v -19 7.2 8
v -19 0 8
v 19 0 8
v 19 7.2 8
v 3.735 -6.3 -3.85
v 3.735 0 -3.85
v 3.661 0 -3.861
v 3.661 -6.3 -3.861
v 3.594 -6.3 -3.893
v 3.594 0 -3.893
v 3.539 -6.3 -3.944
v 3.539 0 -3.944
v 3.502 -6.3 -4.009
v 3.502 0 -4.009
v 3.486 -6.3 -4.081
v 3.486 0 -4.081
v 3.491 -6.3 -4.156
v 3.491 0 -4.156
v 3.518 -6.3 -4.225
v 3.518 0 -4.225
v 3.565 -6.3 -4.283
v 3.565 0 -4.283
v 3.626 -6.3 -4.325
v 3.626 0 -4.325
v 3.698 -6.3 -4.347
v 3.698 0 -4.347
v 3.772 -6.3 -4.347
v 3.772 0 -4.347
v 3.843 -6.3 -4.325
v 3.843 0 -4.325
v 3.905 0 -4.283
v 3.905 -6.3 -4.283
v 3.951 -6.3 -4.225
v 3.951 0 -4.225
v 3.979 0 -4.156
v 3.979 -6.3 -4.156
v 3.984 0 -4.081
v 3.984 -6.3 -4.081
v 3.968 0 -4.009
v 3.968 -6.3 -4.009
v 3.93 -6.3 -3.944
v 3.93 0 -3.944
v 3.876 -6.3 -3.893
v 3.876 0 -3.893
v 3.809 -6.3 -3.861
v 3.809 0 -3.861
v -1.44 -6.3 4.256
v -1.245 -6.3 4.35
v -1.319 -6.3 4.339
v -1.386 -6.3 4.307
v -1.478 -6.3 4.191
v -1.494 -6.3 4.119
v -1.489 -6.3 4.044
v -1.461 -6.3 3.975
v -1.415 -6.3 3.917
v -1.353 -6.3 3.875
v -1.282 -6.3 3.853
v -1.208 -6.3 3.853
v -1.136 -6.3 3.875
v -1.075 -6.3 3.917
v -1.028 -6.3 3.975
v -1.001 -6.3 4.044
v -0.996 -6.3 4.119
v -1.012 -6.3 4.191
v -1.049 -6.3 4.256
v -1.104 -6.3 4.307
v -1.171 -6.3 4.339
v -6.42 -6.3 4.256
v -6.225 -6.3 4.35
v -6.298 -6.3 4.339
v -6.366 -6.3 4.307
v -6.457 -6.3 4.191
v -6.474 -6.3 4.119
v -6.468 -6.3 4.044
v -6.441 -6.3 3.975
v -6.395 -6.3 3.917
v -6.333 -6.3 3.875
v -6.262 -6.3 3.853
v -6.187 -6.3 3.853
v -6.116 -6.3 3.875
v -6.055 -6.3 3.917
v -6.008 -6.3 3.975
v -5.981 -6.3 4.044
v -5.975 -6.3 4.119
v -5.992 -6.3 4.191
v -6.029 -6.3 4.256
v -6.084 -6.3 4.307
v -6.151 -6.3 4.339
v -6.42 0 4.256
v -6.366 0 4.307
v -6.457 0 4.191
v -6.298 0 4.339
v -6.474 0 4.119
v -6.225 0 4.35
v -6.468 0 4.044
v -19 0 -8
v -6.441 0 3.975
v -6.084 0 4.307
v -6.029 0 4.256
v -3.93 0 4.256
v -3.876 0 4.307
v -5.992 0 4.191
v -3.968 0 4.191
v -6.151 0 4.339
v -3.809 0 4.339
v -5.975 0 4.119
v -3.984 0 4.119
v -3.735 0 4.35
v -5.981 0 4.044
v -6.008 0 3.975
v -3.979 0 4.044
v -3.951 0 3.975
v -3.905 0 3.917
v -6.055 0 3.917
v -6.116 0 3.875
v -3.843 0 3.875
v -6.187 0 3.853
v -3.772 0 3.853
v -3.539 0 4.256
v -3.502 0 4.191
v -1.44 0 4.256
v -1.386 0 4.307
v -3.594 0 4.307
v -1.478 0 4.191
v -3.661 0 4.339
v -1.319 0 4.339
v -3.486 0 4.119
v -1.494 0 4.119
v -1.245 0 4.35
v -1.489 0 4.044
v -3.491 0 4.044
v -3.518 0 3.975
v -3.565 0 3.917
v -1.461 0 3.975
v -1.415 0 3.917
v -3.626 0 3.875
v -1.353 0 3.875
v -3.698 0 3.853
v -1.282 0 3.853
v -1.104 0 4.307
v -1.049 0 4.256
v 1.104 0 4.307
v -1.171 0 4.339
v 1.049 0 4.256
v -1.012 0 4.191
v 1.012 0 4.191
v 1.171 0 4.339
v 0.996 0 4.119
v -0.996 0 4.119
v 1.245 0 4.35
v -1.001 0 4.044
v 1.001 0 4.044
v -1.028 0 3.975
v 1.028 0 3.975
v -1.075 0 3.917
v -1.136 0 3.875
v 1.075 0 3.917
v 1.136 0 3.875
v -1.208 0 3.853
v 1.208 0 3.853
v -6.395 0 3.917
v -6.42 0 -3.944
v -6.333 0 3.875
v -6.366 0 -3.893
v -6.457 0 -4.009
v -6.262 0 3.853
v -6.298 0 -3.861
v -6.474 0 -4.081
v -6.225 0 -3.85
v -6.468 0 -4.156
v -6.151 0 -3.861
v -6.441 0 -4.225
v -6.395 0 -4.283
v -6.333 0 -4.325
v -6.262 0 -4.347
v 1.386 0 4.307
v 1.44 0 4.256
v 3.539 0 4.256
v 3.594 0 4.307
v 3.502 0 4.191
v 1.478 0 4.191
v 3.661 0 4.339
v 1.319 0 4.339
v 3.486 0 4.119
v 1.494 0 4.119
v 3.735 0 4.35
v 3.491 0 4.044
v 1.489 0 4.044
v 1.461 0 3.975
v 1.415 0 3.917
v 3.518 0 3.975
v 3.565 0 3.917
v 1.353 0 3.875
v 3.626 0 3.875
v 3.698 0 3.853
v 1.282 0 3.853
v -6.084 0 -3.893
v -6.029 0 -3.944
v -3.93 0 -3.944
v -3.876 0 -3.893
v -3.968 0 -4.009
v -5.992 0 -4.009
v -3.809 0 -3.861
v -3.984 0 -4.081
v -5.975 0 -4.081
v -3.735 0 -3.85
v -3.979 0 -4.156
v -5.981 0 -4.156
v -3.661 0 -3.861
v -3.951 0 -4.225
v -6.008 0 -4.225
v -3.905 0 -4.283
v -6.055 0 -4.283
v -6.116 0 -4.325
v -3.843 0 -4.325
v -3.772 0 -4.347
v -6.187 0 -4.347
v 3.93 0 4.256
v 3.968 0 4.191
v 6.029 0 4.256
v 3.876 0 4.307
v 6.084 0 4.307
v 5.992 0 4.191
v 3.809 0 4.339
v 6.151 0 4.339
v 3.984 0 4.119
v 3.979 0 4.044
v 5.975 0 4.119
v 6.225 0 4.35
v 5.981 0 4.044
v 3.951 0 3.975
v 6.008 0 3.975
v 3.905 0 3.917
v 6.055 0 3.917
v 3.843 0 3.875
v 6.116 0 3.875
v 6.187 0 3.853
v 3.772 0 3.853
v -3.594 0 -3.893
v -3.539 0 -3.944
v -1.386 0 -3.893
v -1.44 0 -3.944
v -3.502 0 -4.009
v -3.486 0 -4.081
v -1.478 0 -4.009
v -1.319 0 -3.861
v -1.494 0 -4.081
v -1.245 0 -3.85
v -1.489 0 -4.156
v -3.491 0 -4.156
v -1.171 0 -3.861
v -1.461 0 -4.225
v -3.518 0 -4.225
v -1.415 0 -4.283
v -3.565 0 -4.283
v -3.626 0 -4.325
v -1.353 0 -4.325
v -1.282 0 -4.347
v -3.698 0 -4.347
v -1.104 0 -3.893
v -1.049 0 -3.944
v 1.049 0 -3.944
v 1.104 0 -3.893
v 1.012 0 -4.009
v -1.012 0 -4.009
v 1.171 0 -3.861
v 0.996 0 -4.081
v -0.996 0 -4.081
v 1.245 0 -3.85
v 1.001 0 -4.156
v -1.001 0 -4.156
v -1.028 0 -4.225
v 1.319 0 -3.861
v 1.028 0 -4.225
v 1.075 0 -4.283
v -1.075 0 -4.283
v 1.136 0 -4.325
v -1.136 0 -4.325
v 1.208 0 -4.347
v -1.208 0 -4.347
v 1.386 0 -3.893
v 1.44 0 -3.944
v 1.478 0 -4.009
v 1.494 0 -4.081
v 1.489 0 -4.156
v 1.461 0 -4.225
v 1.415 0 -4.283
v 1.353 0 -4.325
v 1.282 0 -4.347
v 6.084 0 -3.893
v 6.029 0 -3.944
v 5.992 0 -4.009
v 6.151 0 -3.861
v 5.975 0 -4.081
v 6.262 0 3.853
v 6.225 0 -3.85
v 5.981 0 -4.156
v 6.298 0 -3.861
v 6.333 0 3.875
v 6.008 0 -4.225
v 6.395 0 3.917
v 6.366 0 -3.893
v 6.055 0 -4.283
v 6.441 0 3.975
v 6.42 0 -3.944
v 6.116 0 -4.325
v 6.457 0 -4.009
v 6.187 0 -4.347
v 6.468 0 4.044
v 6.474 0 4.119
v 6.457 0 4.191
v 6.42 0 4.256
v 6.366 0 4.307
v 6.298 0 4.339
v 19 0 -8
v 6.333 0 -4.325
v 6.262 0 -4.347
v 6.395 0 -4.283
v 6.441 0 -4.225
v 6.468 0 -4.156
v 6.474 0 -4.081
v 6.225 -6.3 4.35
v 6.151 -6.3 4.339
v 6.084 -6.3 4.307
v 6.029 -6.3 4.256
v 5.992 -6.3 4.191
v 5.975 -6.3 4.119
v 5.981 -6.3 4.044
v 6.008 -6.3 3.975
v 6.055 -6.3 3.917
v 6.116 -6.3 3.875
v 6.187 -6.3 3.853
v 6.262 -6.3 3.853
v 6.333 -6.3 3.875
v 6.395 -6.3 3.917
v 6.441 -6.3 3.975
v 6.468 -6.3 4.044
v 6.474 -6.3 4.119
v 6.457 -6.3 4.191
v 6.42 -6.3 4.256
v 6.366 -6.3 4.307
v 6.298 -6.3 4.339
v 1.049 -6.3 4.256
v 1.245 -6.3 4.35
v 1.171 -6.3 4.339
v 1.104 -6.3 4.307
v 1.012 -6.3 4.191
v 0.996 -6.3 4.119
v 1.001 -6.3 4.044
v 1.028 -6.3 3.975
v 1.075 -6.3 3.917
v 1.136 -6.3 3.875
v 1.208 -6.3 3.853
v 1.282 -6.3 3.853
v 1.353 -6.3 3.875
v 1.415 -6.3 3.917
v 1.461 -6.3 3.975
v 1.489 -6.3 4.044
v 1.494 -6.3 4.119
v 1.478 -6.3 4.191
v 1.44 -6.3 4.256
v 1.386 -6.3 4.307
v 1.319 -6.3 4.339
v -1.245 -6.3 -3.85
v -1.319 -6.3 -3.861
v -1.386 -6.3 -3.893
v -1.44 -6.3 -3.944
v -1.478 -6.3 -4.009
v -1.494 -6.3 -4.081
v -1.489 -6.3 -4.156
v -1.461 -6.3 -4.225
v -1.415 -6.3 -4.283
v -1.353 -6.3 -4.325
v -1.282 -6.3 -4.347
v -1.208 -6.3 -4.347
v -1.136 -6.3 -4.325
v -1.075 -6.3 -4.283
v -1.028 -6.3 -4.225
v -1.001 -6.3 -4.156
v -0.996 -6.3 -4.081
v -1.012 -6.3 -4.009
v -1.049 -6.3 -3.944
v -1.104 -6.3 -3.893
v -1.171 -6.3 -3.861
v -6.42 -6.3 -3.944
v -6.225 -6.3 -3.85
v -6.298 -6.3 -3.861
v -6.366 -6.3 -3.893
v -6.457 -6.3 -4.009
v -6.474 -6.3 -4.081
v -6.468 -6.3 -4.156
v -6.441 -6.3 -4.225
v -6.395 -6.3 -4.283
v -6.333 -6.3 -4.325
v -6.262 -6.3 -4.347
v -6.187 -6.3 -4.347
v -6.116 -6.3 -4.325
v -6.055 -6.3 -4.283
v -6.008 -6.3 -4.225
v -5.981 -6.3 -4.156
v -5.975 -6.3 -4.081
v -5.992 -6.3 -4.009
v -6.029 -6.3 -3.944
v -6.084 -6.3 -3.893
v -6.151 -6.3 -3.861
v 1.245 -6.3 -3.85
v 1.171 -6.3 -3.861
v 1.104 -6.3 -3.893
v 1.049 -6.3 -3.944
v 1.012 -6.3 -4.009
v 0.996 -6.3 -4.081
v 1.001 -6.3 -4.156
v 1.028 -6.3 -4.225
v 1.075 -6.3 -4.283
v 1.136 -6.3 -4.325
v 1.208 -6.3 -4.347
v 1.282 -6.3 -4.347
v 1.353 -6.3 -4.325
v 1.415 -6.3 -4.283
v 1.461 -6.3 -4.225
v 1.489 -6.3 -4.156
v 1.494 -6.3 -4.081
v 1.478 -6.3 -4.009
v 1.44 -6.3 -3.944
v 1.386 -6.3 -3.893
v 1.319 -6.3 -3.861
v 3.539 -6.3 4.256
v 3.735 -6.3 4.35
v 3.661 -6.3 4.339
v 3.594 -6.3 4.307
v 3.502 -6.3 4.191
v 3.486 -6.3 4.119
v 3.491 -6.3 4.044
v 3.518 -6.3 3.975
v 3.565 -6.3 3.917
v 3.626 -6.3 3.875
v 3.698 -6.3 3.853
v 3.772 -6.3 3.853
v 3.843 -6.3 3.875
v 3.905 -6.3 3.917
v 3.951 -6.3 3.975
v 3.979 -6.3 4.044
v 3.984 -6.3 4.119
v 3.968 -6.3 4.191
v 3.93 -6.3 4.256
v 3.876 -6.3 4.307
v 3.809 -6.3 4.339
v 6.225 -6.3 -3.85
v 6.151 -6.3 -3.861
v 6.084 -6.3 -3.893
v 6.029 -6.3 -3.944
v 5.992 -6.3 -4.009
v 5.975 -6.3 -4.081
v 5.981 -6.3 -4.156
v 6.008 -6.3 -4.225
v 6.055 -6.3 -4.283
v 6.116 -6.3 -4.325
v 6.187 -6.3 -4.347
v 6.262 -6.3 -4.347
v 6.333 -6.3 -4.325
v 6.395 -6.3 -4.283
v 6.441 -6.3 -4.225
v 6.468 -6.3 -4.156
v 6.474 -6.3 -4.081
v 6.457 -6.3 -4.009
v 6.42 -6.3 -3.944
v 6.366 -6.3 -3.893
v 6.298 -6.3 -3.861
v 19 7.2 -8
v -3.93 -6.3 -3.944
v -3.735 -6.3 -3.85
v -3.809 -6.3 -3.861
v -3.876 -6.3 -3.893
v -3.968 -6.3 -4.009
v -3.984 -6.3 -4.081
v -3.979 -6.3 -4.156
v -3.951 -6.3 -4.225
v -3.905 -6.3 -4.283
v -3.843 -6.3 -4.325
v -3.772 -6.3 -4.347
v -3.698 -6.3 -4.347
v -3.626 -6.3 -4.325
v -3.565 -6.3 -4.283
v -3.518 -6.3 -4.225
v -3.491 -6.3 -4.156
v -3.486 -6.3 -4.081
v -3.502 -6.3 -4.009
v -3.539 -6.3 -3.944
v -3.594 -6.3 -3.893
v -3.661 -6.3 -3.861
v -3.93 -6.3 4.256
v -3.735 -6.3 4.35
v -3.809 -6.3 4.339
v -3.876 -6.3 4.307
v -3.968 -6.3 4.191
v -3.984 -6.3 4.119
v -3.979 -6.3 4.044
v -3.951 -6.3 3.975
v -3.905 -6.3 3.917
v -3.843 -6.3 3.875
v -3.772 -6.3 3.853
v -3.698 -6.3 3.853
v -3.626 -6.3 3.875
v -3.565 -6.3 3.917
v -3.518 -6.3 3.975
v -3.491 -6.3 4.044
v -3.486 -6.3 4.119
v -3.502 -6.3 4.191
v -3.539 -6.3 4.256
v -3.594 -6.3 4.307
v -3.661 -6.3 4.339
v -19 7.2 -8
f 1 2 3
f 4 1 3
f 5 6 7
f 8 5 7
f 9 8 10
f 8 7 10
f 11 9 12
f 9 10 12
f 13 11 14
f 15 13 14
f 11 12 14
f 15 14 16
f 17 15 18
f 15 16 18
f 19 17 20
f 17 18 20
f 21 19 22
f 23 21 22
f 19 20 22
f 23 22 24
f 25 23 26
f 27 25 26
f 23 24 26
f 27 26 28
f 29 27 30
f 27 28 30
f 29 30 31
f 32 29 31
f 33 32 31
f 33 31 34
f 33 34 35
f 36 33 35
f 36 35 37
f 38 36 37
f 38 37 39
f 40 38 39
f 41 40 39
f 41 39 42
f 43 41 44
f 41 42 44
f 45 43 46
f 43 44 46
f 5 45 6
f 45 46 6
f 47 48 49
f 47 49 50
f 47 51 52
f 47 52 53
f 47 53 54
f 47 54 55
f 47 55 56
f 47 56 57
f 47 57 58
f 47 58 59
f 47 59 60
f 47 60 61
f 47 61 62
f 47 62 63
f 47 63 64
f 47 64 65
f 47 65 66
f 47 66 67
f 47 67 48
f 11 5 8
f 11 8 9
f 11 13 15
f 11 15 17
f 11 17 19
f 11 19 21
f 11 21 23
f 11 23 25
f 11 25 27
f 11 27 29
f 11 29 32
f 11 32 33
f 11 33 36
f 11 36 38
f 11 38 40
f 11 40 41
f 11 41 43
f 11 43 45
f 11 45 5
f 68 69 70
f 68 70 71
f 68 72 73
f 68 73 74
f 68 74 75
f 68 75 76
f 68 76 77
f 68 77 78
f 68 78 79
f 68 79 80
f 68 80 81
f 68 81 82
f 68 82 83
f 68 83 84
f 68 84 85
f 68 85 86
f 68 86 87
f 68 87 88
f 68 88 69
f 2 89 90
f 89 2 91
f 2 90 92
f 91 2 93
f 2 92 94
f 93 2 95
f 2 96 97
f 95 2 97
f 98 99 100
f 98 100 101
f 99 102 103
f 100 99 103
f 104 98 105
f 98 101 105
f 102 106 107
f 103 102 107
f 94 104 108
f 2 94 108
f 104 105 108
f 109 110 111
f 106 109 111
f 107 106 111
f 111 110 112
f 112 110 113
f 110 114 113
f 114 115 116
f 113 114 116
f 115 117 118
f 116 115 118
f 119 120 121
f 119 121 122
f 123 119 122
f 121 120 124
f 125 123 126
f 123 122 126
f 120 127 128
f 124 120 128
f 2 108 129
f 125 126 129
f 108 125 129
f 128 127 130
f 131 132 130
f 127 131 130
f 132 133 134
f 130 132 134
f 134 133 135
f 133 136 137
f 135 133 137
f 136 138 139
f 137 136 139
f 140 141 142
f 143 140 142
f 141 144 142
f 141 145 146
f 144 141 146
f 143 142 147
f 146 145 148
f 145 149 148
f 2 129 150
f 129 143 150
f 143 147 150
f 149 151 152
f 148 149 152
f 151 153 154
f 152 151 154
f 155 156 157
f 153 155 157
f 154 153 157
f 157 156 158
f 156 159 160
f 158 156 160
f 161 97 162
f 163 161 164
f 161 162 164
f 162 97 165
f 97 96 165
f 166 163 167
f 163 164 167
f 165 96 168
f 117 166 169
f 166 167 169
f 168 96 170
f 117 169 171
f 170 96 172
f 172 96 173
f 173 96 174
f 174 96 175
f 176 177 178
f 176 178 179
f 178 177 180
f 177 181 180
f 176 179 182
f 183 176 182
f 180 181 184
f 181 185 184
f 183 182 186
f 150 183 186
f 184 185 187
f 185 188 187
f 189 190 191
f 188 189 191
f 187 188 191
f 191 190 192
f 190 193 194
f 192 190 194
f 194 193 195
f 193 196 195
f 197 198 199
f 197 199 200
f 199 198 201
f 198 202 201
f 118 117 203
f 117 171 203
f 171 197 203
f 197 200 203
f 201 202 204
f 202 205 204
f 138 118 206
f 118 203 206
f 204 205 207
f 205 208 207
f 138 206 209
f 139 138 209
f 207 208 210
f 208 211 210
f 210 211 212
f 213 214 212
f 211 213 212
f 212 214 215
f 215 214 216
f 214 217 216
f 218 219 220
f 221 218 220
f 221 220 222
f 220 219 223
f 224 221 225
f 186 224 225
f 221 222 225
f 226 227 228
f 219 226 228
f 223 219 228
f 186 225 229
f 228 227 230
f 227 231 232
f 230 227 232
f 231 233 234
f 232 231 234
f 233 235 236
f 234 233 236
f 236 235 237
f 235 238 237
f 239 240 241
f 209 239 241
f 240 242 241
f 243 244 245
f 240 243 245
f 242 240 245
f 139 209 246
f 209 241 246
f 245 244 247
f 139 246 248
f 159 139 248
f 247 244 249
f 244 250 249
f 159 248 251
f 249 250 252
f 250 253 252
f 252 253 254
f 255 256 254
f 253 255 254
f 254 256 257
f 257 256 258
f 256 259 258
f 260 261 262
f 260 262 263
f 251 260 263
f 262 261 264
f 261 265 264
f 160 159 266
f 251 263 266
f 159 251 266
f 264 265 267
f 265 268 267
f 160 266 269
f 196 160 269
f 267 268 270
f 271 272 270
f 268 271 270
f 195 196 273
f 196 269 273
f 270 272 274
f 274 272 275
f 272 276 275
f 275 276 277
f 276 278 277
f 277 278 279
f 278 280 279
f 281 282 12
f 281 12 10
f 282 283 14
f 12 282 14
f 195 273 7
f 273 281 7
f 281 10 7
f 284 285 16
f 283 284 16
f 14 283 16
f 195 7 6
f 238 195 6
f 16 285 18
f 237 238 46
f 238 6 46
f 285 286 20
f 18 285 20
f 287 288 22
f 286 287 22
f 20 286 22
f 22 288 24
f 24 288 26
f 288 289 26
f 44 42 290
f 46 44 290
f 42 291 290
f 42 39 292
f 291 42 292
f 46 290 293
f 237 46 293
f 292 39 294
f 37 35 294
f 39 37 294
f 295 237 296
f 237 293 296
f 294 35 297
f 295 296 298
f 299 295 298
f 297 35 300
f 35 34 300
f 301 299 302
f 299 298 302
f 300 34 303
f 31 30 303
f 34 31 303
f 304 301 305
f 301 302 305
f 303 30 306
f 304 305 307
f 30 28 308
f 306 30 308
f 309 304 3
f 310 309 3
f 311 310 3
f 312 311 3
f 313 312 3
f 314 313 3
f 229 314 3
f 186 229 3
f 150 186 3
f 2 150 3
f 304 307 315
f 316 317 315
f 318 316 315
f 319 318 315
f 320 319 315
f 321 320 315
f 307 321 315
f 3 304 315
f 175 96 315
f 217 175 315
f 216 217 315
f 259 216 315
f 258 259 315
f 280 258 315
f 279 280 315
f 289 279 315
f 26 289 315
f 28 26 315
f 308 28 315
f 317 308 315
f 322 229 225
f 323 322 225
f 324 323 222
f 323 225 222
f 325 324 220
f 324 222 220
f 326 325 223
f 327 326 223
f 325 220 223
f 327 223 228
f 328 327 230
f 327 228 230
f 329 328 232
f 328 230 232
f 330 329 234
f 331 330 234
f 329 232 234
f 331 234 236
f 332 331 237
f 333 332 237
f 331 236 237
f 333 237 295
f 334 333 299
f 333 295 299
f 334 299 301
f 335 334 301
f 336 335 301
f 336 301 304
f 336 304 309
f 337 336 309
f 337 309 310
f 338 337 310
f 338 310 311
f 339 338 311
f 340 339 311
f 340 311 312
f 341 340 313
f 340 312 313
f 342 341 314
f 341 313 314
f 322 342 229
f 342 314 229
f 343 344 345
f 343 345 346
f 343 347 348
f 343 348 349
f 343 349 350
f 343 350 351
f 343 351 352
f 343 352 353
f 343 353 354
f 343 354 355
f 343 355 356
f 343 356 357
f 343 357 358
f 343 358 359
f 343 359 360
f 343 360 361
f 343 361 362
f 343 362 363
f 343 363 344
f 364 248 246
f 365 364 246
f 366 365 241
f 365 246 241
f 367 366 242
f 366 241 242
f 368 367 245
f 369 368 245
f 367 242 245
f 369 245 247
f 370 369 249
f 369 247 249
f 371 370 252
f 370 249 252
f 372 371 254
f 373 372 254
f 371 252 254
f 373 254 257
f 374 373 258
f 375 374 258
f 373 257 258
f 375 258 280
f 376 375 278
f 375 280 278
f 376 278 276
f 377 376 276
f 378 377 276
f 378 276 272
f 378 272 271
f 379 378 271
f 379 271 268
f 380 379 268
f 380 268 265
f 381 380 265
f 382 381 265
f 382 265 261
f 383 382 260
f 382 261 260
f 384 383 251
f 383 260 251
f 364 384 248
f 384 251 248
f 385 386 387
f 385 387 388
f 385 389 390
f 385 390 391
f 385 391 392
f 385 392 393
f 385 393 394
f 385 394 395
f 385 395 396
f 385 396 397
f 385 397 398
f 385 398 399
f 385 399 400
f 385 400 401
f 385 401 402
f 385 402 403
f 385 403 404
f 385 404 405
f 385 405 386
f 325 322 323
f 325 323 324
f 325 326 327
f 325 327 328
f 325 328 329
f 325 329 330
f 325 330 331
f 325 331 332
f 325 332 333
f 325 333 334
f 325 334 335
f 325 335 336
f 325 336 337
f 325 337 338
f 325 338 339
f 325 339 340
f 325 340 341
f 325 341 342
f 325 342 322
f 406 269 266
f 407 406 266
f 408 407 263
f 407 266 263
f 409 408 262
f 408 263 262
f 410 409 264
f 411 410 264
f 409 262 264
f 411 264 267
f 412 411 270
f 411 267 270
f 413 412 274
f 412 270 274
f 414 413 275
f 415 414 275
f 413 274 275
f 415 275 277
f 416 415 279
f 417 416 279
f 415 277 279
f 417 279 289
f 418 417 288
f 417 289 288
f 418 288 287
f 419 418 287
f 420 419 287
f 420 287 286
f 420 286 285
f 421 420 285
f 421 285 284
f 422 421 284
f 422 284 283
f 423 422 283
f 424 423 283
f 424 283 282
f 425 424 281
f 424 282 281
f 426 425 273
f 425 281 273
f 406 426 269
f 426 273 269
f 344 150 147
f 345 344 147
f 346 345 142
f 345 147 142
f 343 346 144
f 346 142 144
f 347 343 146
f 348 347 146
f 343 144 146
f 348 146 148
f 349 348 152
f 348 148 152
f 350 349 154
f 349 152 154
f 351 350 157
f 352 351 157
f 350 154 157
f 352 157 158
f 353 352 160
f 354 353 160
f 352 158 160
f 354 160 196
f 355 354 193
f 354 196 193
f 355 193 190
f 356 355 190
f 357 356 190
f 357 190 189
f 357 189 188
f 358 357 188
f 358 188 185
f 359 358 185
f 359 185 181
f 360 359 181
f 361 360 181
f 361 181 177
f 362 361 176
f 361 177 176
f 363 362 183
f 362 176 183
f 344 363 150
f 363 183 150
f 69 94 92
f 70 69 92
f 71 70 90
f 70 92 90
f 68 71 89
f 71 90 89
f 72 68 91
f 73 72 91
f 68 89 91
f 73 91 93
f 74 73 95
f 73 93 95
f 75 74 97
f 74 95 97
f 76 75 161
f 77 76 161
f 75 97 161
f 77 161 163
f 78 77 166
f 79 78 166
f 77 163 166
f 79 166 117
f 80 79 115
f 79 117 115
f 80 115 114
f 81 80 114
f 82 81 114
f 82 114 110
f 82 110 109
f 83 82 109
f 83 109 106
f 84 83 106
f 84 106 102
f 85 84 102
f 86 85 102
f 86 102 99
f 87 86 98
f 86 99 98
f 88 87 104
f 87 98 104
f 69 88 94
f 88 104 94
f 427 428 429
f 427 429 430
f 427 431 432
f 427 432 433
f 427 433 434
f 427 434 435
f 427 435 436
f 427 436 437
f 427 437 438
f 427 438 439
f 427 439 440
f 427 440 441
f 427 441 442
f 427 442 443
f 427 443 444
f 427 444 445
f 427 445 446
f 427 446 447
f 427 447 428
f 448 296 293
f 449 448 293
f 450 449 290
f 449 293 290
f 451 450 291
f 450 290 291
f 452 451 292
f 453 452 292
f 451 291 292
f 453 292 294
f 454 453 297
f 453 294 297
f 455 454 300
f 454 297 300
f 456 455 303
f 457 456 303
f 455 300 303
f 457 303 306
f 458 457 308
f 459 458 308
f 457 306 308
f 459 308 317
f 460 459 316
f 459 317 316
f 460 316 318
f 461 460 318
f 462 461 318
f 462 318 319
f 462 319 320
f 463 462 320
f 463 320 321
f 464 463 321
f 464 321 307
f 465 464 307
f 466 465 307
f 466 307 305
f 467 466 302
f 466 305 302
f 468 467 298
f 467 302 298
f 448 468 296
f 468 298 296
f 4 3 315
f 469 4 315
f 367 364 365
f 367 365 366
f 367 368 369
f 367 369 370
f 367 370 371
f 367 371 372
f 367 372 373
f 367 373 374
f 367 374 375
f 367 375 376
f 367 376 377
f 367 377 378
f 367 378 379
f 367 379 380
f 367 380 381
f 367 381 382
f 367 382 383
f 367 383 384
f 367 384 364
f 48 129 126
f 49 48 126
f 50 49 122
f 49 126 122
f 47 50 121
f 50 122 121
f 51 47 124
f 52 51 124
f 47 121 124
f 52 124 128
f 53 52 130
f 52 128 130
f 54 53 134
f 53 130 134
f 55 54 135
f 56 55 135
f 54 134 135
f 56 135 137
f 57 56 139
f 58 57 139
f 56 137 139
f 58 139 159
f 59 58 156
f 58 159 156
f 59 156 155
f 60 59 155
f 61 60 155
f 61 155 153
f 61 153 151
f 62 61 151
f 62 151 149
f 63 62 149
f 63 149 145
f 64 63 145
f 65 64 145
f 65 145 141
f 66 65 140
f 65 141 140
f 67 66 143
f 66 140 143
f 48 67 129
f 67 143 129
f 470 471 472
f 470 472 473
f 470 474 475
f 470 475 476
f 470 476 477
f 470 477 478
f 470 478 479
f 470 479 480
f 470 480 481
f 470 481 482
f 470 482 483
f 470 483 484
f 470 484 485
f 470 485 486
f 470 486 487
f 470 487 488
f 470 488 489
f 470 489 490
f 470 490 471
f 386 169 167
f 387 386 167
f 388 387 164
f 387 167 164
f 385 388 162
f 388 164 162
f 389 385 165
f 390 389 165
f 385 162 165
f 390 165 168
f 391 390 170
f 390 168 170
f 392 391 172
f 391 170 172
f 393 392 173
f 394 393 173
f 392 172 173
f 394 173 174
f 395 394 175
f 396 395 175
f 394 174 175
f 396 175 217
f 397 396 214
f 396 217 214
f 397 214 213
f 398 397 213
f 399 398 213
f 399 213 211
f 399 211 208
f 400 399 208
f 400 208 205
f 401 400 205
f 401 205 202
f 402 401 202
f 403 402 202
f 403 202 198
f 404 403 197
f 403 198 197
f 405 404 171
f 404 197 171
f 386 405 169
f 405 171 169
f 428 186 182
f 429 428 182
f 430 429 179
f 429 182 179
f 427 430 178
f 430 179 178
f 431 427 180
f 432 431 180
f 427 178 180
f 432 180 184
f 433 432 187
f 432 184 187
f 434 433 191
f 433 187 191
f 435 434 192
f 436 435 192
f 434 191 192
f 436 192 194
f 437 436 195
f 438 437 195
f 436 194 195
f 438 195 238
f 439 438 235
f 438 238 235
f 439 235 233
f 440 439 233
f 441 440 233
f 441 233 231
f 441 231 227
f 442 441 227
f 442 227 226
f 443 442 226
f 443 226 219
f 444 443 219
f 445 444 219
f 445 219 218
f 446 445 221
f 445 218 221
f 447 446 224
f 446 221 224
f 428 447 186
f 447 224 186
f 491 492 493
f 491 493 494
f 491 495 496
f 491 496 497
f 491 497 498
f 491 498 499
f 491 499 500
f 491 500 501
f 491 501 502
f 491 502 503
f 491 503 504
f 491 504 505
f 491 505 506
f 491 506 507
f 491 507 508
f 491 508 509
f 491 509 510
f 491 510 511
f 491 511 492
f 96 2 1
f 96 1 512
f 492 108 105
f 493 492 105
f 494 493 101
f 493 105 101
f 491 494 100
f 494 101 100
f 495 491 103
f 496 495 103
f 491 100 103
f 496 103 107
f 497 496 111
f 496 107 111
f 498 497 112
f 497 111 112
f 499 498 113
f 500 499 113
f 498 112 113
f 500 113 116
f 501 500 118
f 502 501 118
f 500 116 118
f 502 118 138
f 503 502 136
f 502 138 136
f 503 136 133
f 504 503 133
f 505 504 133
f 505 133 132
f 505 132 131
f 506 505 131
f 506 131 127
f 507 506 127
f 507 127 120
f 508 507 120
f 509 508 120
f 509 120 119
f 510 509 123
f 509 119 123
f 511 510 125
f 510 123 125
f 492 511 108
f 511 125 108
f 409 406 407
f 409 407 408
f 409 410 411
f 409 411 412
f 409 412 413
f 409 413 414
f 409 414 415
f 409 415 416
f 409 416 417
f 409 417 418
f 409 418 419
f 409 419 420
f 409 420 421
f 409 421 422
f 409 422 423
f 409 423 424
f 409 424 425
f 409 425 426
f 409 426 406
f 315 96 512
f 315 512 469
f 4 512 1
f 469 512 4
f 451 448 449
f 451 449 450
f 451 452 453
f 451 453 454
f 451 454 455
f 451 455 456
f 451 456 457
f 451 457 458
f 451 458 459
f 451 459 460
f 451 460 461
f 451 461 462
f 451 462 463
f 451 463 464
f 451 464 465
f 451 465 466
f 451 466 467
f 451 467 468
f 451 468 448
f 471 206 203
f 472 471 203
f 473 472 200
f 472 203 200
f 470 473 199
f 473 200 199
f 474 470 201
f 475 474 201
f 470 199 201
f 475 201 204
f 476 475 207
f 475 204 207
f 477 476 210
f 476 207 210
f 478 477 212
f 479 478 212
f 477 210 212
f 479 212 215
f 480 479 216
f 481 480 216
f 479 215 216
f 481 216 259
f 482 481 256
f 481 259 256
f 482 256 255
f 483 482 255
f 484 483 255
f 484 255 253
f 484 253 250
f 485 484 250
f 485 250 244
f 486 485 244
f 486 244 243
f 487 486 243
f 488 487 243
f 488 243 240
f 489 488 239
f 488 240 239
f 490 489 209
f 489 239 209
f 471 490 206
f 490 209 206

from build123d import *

# Parameters (mm, degrees)
SKETCH_1_W      = 38
SKETCH_1_H      = 16
EXTRUDE_1_DEPTH = 7.2
SKETCH_2_R      = 0.25
EXTRUDE_2_DEPTH = 6.3


with BuildPart() as part:
    # 草图1 → 拉伸1 (new body)
    with BuildSketch(Plane(origin=(0, 0, 0), x_dir=(1, 0, 0), z_dir=(0, 1, 0))):
        Rectangle(SKETCH_1_W, SKETCH_1_H)
    extrude(amount=EXTRUDE_1_DEPTH)

    # 草图2 → 拉伸2 (add)
    with BuildSketch(Plane.XZ):
        with Locations(Location((6.224686657, 4.1, 0), (0, 0, 90))):
            Circle(SKETCH_2_R)
        with Locations(Location((3.734811994, 4.1, 0), (0, 0, 90))):
            Circle(SKETCH_2_R)
        with Locations(Location((1.244937331, 4.1, 0), (0, 0, 90))):
            Circle(SKETCH_2_R)
        with Locations(Location((-1.244937331, 4.1, 0), (0, 0, 90))):
            Circle(SKETCH_2_R)
        with Locations(Location((-3.734811994, 4.1, 0), (0, 0, 90))):
            Circle(SKETCH_2_R)
        with Locations(Location((-6.224686657, 4.1, 0), (0, 0, 90))):
            Circle(SKETCH_2_R)
        with Locations(Location((-6.224686657, -4.1, 0), (0, 0, 90))):
            Circle(SKETCH_2_R)
        with Locations(Location((-3.734811994, -4.1, 0), (0, 0, 90))):
            Circle(SKETCH_2_R)
        with Locations(Location((-1.244937331, -4.1, 0), (0, 0, 90))):
            Circle(SKETCH_2_R)
        with Locations(Location((1.244937331, -4.1, 0), (0, 0, 90))):
            Circle(SKETCH_2_R)
        with Locations(Location((3.734811994, -4.1, 0), (0, 0, 90))):
            Circle(SKETCH_2_R)
        with Locations(Location((6.224686657, -4.1, 0), (0, 0, 90))):
            Circle(SKETCH_2_R)
    extrude(amount=EXTRUDE_2_DEPTH)


solid = part.part
